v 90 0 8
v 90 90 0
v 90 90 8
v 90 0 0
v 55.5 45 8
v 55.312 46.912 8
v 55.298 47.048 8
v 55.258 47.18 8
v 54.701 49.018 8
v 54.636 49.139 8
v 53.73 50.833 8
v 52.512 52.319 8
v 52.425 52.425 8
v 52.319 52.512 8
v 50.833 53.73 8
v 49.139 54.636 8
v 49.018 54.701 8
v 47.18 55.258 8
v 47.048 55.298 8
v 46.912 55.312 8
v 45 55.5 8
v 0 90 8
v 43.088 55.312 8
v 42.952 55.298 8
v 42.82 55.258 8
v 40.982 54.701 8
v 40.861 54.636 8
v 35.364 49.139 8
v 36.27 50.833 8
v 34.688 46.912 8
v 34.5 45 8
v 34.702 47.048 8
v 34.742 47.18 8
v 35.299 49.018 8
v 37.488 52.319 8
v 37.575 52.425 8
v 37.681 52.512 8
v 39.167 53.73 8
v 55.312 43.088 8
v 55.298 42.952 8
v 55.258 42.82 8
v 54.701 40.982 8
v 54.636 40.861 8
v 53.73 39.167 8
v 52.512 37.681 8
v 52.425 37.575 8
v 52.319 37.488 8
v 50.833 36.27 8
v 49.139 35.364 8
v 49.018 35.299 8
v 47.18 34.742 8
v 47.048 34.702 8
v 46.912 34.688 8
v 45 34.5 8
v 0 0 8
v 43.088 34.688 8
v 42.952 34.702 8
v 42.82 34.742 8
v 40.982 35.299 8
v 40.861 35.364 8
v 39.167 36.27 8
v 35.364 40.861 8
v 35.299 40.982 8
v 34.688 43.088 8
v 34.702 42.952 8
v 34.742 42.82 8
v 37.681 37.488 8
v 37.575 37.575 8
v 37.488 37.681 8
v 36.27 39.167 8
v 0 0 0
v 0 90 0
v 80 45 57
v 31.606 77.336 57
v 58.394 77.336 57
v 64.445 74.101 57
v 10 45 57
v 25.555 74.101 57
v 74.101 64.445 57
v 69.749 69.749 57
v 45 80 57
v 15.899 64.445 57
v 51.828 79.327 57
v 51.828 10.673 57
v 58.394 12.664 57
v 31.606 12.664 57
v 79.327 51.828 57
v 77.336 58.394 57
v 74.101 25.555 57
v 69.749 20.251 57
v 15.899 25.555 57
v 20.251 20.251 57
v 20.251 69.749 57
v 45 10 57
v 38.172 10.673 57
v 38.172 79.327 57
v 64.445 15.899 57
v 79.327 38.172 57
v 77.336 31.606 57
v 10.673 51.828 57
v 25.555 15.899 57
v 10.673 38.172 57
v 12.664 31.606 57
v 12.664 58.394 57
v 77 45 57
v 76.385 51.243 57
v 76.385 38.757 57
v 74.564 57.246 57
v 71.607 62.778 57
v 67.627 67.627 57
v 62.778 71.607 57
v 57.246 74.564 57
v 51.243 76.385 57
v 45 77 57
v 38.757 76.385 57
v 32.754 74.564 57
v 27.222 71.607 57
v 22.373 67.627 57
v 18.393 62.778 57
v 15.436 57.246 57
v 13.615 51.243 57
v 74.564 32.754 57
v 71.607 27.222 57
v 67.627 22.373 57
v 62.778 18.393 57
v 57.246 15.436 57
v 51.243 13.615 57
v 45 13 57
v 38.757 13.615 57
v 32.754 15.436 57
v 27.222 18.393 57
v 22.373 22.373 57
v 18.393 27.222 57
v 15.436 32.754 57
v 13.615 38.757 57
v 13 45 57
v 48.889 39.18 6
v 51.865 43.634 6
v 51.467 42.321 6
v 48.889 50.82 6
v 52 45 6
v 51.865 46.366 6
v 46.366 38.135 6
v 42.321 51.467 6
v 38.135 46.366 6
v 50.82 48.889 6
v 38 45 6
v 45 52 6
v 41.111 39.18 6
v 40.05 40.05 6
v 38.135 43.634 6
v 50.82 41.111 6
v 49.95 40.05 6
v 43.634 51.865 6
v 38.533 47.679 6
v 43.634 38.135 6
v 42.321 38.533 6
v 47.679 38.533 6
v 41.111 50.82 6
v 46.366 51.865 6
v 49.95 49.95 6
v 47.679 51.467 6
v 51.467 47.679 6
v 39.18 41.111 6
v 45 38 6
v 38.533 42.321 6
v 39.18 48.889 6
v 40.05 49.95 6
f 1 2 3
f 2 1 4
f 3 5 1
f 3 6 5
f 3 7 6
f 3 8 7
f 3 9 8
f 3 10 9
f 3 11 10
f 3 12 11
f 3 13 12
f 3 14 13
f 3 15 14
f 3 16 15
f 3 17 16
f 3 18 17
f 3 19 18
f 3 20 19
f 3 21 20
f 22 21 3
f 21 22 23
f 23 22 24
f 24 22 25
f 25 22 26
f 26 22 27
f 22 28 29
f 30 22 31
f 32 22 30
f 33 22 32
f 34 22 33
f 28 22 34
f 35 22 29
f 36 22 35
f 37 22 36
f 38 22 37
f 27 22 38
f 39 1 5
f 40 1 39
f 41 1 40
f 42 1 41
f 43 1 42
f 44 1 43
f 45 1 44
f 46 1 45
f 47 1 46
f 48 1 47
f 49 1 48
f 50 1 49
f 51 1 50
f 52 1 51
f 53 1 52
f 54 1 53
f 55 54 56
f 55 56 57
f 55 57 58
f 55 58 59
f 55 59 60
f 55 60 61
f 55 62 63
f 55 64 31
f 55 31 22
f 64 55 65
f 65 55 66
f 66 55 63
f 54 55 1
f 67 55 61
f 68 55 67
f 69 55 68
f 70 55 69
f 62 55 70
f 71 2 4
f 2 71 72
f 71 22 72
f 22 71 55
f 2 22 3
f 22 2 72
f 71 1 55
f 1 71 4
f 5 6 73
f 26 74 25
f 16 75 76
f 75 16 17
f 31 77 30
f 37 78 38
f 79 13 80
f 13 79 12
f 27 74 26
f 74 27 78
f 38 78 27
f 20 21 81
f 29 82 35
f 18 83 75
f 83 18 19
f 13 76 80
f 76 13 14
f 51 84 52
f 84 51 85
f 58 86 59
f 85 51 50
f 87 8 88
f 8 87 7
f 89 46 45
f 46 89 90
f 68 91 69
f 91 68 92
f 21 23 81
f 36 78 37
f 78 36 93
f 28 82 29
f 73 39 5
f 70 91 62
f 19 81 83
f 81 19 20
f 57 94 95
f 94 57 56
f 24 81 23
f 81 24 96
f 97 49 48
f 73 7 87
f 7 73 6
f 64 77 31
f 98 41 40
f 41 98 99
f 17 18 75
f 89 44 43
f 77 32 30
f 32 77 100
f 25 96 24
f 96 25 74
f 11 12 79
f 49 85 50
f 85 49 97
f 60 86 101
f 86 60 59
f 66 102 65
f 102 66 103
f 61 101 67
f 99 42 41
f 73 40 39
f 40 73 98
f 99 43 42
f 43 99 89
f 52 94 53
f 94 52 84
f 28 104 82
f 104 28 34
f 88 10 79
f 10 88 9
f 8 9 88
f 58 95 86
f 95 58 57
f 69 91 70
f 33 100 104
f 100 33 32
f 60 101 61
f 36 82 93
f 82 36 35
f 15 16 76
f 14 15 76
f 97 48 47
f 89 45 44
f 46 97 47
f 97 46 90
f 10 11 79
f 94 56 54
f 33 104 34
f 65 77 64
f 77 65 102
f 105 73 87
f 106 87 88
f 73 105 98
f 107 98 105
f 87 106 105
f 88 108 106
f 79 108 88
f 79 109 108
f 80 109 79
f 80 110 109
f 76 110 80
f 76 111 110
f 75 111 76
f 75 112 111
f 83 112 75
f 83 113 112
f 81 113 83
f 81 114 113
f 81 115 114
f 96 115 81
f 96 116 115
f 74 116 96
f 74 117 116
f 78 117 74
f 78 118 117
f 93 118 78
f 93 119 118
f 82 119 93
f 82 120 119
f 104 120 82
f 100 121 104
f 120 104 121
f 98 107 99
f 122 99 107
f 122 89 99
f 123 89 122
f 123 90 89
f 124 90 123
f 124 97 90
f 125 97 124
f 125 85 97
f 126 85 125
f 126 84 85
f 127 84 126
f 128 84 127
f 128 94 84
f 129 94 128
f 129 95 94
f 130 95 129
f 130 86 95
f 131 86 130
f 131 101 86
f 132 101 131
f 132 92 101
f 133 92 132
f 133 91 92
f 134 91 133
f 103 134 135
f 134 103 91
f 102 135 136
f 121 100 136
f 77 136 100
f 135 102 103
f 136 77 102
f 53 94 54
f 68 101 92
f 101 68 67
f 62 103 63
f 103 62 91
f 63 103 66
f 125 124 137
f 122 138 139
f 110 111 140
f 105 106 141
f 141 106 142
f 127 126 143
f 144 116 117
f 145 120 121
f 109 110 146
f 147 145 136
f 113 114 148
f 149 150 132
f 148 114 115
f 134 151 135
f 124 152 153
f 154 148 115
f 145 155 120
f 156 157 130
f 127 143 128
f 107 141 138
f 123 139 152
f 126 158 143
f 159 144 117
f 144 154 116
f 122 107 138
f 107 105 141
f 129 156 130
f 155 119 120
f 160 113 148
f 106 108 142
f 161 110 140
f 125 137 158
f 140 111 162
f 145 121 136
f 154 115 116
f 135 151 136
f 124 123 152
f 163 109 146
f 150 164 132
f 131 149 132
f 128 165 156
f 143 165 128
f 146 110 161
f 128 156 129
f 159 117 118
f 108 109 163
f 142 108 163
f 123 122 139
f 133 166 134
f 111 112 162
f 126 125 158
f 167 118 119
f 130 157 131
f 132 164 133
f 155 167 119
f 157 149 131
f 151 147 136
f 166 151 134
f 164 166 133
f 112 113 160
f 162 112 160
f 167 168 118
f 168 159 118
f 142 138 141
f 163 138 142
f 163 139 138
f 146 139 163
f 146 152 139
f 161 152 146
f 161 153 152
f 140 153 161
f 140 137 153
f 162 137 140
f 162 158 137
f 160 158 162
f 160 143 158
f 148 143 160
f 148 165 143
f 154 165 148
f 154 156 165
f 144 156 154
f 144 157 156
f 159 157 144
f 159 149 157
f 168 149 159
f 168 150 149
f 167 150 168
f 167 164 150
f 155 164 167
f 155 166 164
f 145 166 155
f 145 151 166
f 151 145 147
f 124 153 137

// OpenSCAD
$fn = 32;

// ----------------------------------------------------------------------
// Hopper: funnel with square flange
// ----------------------------------------------------------------------

// --- parameters (mm) ---
fl = 90;                  // flange side, X and Y
fl_t = 8;                 // flange thickness
cone_h = 50;              // cone height above the flange
top_d = 70;               // cone mouth diameter
bot_d = 20;               // cone spout diameter
wall = 3;                 // cone wall thickness
fit_tol = 0.05;           // tolerance for press fits, mm
free_tol = 0.2;           // tolerance for clearance fits, mm

bore_d = bot_d - 2 * wall;  // spout bore diameter
total_h = fl_t + cone_h - 1;  // overall height

difference() {
  union() {
    cube([fl, fl, fl_t]);
    translate([fl / 2, fl / 2, fl_t - 1])
      cylinder(h = cone_h, d1 = bot_d, d2 = top_d);
  }
  translate([fl / 2, fl / 2, fl_t - 2])
    cylinder(h = cone_h + 1, d1 = bore_d, d2 = top_d - 2 * wall);
}
